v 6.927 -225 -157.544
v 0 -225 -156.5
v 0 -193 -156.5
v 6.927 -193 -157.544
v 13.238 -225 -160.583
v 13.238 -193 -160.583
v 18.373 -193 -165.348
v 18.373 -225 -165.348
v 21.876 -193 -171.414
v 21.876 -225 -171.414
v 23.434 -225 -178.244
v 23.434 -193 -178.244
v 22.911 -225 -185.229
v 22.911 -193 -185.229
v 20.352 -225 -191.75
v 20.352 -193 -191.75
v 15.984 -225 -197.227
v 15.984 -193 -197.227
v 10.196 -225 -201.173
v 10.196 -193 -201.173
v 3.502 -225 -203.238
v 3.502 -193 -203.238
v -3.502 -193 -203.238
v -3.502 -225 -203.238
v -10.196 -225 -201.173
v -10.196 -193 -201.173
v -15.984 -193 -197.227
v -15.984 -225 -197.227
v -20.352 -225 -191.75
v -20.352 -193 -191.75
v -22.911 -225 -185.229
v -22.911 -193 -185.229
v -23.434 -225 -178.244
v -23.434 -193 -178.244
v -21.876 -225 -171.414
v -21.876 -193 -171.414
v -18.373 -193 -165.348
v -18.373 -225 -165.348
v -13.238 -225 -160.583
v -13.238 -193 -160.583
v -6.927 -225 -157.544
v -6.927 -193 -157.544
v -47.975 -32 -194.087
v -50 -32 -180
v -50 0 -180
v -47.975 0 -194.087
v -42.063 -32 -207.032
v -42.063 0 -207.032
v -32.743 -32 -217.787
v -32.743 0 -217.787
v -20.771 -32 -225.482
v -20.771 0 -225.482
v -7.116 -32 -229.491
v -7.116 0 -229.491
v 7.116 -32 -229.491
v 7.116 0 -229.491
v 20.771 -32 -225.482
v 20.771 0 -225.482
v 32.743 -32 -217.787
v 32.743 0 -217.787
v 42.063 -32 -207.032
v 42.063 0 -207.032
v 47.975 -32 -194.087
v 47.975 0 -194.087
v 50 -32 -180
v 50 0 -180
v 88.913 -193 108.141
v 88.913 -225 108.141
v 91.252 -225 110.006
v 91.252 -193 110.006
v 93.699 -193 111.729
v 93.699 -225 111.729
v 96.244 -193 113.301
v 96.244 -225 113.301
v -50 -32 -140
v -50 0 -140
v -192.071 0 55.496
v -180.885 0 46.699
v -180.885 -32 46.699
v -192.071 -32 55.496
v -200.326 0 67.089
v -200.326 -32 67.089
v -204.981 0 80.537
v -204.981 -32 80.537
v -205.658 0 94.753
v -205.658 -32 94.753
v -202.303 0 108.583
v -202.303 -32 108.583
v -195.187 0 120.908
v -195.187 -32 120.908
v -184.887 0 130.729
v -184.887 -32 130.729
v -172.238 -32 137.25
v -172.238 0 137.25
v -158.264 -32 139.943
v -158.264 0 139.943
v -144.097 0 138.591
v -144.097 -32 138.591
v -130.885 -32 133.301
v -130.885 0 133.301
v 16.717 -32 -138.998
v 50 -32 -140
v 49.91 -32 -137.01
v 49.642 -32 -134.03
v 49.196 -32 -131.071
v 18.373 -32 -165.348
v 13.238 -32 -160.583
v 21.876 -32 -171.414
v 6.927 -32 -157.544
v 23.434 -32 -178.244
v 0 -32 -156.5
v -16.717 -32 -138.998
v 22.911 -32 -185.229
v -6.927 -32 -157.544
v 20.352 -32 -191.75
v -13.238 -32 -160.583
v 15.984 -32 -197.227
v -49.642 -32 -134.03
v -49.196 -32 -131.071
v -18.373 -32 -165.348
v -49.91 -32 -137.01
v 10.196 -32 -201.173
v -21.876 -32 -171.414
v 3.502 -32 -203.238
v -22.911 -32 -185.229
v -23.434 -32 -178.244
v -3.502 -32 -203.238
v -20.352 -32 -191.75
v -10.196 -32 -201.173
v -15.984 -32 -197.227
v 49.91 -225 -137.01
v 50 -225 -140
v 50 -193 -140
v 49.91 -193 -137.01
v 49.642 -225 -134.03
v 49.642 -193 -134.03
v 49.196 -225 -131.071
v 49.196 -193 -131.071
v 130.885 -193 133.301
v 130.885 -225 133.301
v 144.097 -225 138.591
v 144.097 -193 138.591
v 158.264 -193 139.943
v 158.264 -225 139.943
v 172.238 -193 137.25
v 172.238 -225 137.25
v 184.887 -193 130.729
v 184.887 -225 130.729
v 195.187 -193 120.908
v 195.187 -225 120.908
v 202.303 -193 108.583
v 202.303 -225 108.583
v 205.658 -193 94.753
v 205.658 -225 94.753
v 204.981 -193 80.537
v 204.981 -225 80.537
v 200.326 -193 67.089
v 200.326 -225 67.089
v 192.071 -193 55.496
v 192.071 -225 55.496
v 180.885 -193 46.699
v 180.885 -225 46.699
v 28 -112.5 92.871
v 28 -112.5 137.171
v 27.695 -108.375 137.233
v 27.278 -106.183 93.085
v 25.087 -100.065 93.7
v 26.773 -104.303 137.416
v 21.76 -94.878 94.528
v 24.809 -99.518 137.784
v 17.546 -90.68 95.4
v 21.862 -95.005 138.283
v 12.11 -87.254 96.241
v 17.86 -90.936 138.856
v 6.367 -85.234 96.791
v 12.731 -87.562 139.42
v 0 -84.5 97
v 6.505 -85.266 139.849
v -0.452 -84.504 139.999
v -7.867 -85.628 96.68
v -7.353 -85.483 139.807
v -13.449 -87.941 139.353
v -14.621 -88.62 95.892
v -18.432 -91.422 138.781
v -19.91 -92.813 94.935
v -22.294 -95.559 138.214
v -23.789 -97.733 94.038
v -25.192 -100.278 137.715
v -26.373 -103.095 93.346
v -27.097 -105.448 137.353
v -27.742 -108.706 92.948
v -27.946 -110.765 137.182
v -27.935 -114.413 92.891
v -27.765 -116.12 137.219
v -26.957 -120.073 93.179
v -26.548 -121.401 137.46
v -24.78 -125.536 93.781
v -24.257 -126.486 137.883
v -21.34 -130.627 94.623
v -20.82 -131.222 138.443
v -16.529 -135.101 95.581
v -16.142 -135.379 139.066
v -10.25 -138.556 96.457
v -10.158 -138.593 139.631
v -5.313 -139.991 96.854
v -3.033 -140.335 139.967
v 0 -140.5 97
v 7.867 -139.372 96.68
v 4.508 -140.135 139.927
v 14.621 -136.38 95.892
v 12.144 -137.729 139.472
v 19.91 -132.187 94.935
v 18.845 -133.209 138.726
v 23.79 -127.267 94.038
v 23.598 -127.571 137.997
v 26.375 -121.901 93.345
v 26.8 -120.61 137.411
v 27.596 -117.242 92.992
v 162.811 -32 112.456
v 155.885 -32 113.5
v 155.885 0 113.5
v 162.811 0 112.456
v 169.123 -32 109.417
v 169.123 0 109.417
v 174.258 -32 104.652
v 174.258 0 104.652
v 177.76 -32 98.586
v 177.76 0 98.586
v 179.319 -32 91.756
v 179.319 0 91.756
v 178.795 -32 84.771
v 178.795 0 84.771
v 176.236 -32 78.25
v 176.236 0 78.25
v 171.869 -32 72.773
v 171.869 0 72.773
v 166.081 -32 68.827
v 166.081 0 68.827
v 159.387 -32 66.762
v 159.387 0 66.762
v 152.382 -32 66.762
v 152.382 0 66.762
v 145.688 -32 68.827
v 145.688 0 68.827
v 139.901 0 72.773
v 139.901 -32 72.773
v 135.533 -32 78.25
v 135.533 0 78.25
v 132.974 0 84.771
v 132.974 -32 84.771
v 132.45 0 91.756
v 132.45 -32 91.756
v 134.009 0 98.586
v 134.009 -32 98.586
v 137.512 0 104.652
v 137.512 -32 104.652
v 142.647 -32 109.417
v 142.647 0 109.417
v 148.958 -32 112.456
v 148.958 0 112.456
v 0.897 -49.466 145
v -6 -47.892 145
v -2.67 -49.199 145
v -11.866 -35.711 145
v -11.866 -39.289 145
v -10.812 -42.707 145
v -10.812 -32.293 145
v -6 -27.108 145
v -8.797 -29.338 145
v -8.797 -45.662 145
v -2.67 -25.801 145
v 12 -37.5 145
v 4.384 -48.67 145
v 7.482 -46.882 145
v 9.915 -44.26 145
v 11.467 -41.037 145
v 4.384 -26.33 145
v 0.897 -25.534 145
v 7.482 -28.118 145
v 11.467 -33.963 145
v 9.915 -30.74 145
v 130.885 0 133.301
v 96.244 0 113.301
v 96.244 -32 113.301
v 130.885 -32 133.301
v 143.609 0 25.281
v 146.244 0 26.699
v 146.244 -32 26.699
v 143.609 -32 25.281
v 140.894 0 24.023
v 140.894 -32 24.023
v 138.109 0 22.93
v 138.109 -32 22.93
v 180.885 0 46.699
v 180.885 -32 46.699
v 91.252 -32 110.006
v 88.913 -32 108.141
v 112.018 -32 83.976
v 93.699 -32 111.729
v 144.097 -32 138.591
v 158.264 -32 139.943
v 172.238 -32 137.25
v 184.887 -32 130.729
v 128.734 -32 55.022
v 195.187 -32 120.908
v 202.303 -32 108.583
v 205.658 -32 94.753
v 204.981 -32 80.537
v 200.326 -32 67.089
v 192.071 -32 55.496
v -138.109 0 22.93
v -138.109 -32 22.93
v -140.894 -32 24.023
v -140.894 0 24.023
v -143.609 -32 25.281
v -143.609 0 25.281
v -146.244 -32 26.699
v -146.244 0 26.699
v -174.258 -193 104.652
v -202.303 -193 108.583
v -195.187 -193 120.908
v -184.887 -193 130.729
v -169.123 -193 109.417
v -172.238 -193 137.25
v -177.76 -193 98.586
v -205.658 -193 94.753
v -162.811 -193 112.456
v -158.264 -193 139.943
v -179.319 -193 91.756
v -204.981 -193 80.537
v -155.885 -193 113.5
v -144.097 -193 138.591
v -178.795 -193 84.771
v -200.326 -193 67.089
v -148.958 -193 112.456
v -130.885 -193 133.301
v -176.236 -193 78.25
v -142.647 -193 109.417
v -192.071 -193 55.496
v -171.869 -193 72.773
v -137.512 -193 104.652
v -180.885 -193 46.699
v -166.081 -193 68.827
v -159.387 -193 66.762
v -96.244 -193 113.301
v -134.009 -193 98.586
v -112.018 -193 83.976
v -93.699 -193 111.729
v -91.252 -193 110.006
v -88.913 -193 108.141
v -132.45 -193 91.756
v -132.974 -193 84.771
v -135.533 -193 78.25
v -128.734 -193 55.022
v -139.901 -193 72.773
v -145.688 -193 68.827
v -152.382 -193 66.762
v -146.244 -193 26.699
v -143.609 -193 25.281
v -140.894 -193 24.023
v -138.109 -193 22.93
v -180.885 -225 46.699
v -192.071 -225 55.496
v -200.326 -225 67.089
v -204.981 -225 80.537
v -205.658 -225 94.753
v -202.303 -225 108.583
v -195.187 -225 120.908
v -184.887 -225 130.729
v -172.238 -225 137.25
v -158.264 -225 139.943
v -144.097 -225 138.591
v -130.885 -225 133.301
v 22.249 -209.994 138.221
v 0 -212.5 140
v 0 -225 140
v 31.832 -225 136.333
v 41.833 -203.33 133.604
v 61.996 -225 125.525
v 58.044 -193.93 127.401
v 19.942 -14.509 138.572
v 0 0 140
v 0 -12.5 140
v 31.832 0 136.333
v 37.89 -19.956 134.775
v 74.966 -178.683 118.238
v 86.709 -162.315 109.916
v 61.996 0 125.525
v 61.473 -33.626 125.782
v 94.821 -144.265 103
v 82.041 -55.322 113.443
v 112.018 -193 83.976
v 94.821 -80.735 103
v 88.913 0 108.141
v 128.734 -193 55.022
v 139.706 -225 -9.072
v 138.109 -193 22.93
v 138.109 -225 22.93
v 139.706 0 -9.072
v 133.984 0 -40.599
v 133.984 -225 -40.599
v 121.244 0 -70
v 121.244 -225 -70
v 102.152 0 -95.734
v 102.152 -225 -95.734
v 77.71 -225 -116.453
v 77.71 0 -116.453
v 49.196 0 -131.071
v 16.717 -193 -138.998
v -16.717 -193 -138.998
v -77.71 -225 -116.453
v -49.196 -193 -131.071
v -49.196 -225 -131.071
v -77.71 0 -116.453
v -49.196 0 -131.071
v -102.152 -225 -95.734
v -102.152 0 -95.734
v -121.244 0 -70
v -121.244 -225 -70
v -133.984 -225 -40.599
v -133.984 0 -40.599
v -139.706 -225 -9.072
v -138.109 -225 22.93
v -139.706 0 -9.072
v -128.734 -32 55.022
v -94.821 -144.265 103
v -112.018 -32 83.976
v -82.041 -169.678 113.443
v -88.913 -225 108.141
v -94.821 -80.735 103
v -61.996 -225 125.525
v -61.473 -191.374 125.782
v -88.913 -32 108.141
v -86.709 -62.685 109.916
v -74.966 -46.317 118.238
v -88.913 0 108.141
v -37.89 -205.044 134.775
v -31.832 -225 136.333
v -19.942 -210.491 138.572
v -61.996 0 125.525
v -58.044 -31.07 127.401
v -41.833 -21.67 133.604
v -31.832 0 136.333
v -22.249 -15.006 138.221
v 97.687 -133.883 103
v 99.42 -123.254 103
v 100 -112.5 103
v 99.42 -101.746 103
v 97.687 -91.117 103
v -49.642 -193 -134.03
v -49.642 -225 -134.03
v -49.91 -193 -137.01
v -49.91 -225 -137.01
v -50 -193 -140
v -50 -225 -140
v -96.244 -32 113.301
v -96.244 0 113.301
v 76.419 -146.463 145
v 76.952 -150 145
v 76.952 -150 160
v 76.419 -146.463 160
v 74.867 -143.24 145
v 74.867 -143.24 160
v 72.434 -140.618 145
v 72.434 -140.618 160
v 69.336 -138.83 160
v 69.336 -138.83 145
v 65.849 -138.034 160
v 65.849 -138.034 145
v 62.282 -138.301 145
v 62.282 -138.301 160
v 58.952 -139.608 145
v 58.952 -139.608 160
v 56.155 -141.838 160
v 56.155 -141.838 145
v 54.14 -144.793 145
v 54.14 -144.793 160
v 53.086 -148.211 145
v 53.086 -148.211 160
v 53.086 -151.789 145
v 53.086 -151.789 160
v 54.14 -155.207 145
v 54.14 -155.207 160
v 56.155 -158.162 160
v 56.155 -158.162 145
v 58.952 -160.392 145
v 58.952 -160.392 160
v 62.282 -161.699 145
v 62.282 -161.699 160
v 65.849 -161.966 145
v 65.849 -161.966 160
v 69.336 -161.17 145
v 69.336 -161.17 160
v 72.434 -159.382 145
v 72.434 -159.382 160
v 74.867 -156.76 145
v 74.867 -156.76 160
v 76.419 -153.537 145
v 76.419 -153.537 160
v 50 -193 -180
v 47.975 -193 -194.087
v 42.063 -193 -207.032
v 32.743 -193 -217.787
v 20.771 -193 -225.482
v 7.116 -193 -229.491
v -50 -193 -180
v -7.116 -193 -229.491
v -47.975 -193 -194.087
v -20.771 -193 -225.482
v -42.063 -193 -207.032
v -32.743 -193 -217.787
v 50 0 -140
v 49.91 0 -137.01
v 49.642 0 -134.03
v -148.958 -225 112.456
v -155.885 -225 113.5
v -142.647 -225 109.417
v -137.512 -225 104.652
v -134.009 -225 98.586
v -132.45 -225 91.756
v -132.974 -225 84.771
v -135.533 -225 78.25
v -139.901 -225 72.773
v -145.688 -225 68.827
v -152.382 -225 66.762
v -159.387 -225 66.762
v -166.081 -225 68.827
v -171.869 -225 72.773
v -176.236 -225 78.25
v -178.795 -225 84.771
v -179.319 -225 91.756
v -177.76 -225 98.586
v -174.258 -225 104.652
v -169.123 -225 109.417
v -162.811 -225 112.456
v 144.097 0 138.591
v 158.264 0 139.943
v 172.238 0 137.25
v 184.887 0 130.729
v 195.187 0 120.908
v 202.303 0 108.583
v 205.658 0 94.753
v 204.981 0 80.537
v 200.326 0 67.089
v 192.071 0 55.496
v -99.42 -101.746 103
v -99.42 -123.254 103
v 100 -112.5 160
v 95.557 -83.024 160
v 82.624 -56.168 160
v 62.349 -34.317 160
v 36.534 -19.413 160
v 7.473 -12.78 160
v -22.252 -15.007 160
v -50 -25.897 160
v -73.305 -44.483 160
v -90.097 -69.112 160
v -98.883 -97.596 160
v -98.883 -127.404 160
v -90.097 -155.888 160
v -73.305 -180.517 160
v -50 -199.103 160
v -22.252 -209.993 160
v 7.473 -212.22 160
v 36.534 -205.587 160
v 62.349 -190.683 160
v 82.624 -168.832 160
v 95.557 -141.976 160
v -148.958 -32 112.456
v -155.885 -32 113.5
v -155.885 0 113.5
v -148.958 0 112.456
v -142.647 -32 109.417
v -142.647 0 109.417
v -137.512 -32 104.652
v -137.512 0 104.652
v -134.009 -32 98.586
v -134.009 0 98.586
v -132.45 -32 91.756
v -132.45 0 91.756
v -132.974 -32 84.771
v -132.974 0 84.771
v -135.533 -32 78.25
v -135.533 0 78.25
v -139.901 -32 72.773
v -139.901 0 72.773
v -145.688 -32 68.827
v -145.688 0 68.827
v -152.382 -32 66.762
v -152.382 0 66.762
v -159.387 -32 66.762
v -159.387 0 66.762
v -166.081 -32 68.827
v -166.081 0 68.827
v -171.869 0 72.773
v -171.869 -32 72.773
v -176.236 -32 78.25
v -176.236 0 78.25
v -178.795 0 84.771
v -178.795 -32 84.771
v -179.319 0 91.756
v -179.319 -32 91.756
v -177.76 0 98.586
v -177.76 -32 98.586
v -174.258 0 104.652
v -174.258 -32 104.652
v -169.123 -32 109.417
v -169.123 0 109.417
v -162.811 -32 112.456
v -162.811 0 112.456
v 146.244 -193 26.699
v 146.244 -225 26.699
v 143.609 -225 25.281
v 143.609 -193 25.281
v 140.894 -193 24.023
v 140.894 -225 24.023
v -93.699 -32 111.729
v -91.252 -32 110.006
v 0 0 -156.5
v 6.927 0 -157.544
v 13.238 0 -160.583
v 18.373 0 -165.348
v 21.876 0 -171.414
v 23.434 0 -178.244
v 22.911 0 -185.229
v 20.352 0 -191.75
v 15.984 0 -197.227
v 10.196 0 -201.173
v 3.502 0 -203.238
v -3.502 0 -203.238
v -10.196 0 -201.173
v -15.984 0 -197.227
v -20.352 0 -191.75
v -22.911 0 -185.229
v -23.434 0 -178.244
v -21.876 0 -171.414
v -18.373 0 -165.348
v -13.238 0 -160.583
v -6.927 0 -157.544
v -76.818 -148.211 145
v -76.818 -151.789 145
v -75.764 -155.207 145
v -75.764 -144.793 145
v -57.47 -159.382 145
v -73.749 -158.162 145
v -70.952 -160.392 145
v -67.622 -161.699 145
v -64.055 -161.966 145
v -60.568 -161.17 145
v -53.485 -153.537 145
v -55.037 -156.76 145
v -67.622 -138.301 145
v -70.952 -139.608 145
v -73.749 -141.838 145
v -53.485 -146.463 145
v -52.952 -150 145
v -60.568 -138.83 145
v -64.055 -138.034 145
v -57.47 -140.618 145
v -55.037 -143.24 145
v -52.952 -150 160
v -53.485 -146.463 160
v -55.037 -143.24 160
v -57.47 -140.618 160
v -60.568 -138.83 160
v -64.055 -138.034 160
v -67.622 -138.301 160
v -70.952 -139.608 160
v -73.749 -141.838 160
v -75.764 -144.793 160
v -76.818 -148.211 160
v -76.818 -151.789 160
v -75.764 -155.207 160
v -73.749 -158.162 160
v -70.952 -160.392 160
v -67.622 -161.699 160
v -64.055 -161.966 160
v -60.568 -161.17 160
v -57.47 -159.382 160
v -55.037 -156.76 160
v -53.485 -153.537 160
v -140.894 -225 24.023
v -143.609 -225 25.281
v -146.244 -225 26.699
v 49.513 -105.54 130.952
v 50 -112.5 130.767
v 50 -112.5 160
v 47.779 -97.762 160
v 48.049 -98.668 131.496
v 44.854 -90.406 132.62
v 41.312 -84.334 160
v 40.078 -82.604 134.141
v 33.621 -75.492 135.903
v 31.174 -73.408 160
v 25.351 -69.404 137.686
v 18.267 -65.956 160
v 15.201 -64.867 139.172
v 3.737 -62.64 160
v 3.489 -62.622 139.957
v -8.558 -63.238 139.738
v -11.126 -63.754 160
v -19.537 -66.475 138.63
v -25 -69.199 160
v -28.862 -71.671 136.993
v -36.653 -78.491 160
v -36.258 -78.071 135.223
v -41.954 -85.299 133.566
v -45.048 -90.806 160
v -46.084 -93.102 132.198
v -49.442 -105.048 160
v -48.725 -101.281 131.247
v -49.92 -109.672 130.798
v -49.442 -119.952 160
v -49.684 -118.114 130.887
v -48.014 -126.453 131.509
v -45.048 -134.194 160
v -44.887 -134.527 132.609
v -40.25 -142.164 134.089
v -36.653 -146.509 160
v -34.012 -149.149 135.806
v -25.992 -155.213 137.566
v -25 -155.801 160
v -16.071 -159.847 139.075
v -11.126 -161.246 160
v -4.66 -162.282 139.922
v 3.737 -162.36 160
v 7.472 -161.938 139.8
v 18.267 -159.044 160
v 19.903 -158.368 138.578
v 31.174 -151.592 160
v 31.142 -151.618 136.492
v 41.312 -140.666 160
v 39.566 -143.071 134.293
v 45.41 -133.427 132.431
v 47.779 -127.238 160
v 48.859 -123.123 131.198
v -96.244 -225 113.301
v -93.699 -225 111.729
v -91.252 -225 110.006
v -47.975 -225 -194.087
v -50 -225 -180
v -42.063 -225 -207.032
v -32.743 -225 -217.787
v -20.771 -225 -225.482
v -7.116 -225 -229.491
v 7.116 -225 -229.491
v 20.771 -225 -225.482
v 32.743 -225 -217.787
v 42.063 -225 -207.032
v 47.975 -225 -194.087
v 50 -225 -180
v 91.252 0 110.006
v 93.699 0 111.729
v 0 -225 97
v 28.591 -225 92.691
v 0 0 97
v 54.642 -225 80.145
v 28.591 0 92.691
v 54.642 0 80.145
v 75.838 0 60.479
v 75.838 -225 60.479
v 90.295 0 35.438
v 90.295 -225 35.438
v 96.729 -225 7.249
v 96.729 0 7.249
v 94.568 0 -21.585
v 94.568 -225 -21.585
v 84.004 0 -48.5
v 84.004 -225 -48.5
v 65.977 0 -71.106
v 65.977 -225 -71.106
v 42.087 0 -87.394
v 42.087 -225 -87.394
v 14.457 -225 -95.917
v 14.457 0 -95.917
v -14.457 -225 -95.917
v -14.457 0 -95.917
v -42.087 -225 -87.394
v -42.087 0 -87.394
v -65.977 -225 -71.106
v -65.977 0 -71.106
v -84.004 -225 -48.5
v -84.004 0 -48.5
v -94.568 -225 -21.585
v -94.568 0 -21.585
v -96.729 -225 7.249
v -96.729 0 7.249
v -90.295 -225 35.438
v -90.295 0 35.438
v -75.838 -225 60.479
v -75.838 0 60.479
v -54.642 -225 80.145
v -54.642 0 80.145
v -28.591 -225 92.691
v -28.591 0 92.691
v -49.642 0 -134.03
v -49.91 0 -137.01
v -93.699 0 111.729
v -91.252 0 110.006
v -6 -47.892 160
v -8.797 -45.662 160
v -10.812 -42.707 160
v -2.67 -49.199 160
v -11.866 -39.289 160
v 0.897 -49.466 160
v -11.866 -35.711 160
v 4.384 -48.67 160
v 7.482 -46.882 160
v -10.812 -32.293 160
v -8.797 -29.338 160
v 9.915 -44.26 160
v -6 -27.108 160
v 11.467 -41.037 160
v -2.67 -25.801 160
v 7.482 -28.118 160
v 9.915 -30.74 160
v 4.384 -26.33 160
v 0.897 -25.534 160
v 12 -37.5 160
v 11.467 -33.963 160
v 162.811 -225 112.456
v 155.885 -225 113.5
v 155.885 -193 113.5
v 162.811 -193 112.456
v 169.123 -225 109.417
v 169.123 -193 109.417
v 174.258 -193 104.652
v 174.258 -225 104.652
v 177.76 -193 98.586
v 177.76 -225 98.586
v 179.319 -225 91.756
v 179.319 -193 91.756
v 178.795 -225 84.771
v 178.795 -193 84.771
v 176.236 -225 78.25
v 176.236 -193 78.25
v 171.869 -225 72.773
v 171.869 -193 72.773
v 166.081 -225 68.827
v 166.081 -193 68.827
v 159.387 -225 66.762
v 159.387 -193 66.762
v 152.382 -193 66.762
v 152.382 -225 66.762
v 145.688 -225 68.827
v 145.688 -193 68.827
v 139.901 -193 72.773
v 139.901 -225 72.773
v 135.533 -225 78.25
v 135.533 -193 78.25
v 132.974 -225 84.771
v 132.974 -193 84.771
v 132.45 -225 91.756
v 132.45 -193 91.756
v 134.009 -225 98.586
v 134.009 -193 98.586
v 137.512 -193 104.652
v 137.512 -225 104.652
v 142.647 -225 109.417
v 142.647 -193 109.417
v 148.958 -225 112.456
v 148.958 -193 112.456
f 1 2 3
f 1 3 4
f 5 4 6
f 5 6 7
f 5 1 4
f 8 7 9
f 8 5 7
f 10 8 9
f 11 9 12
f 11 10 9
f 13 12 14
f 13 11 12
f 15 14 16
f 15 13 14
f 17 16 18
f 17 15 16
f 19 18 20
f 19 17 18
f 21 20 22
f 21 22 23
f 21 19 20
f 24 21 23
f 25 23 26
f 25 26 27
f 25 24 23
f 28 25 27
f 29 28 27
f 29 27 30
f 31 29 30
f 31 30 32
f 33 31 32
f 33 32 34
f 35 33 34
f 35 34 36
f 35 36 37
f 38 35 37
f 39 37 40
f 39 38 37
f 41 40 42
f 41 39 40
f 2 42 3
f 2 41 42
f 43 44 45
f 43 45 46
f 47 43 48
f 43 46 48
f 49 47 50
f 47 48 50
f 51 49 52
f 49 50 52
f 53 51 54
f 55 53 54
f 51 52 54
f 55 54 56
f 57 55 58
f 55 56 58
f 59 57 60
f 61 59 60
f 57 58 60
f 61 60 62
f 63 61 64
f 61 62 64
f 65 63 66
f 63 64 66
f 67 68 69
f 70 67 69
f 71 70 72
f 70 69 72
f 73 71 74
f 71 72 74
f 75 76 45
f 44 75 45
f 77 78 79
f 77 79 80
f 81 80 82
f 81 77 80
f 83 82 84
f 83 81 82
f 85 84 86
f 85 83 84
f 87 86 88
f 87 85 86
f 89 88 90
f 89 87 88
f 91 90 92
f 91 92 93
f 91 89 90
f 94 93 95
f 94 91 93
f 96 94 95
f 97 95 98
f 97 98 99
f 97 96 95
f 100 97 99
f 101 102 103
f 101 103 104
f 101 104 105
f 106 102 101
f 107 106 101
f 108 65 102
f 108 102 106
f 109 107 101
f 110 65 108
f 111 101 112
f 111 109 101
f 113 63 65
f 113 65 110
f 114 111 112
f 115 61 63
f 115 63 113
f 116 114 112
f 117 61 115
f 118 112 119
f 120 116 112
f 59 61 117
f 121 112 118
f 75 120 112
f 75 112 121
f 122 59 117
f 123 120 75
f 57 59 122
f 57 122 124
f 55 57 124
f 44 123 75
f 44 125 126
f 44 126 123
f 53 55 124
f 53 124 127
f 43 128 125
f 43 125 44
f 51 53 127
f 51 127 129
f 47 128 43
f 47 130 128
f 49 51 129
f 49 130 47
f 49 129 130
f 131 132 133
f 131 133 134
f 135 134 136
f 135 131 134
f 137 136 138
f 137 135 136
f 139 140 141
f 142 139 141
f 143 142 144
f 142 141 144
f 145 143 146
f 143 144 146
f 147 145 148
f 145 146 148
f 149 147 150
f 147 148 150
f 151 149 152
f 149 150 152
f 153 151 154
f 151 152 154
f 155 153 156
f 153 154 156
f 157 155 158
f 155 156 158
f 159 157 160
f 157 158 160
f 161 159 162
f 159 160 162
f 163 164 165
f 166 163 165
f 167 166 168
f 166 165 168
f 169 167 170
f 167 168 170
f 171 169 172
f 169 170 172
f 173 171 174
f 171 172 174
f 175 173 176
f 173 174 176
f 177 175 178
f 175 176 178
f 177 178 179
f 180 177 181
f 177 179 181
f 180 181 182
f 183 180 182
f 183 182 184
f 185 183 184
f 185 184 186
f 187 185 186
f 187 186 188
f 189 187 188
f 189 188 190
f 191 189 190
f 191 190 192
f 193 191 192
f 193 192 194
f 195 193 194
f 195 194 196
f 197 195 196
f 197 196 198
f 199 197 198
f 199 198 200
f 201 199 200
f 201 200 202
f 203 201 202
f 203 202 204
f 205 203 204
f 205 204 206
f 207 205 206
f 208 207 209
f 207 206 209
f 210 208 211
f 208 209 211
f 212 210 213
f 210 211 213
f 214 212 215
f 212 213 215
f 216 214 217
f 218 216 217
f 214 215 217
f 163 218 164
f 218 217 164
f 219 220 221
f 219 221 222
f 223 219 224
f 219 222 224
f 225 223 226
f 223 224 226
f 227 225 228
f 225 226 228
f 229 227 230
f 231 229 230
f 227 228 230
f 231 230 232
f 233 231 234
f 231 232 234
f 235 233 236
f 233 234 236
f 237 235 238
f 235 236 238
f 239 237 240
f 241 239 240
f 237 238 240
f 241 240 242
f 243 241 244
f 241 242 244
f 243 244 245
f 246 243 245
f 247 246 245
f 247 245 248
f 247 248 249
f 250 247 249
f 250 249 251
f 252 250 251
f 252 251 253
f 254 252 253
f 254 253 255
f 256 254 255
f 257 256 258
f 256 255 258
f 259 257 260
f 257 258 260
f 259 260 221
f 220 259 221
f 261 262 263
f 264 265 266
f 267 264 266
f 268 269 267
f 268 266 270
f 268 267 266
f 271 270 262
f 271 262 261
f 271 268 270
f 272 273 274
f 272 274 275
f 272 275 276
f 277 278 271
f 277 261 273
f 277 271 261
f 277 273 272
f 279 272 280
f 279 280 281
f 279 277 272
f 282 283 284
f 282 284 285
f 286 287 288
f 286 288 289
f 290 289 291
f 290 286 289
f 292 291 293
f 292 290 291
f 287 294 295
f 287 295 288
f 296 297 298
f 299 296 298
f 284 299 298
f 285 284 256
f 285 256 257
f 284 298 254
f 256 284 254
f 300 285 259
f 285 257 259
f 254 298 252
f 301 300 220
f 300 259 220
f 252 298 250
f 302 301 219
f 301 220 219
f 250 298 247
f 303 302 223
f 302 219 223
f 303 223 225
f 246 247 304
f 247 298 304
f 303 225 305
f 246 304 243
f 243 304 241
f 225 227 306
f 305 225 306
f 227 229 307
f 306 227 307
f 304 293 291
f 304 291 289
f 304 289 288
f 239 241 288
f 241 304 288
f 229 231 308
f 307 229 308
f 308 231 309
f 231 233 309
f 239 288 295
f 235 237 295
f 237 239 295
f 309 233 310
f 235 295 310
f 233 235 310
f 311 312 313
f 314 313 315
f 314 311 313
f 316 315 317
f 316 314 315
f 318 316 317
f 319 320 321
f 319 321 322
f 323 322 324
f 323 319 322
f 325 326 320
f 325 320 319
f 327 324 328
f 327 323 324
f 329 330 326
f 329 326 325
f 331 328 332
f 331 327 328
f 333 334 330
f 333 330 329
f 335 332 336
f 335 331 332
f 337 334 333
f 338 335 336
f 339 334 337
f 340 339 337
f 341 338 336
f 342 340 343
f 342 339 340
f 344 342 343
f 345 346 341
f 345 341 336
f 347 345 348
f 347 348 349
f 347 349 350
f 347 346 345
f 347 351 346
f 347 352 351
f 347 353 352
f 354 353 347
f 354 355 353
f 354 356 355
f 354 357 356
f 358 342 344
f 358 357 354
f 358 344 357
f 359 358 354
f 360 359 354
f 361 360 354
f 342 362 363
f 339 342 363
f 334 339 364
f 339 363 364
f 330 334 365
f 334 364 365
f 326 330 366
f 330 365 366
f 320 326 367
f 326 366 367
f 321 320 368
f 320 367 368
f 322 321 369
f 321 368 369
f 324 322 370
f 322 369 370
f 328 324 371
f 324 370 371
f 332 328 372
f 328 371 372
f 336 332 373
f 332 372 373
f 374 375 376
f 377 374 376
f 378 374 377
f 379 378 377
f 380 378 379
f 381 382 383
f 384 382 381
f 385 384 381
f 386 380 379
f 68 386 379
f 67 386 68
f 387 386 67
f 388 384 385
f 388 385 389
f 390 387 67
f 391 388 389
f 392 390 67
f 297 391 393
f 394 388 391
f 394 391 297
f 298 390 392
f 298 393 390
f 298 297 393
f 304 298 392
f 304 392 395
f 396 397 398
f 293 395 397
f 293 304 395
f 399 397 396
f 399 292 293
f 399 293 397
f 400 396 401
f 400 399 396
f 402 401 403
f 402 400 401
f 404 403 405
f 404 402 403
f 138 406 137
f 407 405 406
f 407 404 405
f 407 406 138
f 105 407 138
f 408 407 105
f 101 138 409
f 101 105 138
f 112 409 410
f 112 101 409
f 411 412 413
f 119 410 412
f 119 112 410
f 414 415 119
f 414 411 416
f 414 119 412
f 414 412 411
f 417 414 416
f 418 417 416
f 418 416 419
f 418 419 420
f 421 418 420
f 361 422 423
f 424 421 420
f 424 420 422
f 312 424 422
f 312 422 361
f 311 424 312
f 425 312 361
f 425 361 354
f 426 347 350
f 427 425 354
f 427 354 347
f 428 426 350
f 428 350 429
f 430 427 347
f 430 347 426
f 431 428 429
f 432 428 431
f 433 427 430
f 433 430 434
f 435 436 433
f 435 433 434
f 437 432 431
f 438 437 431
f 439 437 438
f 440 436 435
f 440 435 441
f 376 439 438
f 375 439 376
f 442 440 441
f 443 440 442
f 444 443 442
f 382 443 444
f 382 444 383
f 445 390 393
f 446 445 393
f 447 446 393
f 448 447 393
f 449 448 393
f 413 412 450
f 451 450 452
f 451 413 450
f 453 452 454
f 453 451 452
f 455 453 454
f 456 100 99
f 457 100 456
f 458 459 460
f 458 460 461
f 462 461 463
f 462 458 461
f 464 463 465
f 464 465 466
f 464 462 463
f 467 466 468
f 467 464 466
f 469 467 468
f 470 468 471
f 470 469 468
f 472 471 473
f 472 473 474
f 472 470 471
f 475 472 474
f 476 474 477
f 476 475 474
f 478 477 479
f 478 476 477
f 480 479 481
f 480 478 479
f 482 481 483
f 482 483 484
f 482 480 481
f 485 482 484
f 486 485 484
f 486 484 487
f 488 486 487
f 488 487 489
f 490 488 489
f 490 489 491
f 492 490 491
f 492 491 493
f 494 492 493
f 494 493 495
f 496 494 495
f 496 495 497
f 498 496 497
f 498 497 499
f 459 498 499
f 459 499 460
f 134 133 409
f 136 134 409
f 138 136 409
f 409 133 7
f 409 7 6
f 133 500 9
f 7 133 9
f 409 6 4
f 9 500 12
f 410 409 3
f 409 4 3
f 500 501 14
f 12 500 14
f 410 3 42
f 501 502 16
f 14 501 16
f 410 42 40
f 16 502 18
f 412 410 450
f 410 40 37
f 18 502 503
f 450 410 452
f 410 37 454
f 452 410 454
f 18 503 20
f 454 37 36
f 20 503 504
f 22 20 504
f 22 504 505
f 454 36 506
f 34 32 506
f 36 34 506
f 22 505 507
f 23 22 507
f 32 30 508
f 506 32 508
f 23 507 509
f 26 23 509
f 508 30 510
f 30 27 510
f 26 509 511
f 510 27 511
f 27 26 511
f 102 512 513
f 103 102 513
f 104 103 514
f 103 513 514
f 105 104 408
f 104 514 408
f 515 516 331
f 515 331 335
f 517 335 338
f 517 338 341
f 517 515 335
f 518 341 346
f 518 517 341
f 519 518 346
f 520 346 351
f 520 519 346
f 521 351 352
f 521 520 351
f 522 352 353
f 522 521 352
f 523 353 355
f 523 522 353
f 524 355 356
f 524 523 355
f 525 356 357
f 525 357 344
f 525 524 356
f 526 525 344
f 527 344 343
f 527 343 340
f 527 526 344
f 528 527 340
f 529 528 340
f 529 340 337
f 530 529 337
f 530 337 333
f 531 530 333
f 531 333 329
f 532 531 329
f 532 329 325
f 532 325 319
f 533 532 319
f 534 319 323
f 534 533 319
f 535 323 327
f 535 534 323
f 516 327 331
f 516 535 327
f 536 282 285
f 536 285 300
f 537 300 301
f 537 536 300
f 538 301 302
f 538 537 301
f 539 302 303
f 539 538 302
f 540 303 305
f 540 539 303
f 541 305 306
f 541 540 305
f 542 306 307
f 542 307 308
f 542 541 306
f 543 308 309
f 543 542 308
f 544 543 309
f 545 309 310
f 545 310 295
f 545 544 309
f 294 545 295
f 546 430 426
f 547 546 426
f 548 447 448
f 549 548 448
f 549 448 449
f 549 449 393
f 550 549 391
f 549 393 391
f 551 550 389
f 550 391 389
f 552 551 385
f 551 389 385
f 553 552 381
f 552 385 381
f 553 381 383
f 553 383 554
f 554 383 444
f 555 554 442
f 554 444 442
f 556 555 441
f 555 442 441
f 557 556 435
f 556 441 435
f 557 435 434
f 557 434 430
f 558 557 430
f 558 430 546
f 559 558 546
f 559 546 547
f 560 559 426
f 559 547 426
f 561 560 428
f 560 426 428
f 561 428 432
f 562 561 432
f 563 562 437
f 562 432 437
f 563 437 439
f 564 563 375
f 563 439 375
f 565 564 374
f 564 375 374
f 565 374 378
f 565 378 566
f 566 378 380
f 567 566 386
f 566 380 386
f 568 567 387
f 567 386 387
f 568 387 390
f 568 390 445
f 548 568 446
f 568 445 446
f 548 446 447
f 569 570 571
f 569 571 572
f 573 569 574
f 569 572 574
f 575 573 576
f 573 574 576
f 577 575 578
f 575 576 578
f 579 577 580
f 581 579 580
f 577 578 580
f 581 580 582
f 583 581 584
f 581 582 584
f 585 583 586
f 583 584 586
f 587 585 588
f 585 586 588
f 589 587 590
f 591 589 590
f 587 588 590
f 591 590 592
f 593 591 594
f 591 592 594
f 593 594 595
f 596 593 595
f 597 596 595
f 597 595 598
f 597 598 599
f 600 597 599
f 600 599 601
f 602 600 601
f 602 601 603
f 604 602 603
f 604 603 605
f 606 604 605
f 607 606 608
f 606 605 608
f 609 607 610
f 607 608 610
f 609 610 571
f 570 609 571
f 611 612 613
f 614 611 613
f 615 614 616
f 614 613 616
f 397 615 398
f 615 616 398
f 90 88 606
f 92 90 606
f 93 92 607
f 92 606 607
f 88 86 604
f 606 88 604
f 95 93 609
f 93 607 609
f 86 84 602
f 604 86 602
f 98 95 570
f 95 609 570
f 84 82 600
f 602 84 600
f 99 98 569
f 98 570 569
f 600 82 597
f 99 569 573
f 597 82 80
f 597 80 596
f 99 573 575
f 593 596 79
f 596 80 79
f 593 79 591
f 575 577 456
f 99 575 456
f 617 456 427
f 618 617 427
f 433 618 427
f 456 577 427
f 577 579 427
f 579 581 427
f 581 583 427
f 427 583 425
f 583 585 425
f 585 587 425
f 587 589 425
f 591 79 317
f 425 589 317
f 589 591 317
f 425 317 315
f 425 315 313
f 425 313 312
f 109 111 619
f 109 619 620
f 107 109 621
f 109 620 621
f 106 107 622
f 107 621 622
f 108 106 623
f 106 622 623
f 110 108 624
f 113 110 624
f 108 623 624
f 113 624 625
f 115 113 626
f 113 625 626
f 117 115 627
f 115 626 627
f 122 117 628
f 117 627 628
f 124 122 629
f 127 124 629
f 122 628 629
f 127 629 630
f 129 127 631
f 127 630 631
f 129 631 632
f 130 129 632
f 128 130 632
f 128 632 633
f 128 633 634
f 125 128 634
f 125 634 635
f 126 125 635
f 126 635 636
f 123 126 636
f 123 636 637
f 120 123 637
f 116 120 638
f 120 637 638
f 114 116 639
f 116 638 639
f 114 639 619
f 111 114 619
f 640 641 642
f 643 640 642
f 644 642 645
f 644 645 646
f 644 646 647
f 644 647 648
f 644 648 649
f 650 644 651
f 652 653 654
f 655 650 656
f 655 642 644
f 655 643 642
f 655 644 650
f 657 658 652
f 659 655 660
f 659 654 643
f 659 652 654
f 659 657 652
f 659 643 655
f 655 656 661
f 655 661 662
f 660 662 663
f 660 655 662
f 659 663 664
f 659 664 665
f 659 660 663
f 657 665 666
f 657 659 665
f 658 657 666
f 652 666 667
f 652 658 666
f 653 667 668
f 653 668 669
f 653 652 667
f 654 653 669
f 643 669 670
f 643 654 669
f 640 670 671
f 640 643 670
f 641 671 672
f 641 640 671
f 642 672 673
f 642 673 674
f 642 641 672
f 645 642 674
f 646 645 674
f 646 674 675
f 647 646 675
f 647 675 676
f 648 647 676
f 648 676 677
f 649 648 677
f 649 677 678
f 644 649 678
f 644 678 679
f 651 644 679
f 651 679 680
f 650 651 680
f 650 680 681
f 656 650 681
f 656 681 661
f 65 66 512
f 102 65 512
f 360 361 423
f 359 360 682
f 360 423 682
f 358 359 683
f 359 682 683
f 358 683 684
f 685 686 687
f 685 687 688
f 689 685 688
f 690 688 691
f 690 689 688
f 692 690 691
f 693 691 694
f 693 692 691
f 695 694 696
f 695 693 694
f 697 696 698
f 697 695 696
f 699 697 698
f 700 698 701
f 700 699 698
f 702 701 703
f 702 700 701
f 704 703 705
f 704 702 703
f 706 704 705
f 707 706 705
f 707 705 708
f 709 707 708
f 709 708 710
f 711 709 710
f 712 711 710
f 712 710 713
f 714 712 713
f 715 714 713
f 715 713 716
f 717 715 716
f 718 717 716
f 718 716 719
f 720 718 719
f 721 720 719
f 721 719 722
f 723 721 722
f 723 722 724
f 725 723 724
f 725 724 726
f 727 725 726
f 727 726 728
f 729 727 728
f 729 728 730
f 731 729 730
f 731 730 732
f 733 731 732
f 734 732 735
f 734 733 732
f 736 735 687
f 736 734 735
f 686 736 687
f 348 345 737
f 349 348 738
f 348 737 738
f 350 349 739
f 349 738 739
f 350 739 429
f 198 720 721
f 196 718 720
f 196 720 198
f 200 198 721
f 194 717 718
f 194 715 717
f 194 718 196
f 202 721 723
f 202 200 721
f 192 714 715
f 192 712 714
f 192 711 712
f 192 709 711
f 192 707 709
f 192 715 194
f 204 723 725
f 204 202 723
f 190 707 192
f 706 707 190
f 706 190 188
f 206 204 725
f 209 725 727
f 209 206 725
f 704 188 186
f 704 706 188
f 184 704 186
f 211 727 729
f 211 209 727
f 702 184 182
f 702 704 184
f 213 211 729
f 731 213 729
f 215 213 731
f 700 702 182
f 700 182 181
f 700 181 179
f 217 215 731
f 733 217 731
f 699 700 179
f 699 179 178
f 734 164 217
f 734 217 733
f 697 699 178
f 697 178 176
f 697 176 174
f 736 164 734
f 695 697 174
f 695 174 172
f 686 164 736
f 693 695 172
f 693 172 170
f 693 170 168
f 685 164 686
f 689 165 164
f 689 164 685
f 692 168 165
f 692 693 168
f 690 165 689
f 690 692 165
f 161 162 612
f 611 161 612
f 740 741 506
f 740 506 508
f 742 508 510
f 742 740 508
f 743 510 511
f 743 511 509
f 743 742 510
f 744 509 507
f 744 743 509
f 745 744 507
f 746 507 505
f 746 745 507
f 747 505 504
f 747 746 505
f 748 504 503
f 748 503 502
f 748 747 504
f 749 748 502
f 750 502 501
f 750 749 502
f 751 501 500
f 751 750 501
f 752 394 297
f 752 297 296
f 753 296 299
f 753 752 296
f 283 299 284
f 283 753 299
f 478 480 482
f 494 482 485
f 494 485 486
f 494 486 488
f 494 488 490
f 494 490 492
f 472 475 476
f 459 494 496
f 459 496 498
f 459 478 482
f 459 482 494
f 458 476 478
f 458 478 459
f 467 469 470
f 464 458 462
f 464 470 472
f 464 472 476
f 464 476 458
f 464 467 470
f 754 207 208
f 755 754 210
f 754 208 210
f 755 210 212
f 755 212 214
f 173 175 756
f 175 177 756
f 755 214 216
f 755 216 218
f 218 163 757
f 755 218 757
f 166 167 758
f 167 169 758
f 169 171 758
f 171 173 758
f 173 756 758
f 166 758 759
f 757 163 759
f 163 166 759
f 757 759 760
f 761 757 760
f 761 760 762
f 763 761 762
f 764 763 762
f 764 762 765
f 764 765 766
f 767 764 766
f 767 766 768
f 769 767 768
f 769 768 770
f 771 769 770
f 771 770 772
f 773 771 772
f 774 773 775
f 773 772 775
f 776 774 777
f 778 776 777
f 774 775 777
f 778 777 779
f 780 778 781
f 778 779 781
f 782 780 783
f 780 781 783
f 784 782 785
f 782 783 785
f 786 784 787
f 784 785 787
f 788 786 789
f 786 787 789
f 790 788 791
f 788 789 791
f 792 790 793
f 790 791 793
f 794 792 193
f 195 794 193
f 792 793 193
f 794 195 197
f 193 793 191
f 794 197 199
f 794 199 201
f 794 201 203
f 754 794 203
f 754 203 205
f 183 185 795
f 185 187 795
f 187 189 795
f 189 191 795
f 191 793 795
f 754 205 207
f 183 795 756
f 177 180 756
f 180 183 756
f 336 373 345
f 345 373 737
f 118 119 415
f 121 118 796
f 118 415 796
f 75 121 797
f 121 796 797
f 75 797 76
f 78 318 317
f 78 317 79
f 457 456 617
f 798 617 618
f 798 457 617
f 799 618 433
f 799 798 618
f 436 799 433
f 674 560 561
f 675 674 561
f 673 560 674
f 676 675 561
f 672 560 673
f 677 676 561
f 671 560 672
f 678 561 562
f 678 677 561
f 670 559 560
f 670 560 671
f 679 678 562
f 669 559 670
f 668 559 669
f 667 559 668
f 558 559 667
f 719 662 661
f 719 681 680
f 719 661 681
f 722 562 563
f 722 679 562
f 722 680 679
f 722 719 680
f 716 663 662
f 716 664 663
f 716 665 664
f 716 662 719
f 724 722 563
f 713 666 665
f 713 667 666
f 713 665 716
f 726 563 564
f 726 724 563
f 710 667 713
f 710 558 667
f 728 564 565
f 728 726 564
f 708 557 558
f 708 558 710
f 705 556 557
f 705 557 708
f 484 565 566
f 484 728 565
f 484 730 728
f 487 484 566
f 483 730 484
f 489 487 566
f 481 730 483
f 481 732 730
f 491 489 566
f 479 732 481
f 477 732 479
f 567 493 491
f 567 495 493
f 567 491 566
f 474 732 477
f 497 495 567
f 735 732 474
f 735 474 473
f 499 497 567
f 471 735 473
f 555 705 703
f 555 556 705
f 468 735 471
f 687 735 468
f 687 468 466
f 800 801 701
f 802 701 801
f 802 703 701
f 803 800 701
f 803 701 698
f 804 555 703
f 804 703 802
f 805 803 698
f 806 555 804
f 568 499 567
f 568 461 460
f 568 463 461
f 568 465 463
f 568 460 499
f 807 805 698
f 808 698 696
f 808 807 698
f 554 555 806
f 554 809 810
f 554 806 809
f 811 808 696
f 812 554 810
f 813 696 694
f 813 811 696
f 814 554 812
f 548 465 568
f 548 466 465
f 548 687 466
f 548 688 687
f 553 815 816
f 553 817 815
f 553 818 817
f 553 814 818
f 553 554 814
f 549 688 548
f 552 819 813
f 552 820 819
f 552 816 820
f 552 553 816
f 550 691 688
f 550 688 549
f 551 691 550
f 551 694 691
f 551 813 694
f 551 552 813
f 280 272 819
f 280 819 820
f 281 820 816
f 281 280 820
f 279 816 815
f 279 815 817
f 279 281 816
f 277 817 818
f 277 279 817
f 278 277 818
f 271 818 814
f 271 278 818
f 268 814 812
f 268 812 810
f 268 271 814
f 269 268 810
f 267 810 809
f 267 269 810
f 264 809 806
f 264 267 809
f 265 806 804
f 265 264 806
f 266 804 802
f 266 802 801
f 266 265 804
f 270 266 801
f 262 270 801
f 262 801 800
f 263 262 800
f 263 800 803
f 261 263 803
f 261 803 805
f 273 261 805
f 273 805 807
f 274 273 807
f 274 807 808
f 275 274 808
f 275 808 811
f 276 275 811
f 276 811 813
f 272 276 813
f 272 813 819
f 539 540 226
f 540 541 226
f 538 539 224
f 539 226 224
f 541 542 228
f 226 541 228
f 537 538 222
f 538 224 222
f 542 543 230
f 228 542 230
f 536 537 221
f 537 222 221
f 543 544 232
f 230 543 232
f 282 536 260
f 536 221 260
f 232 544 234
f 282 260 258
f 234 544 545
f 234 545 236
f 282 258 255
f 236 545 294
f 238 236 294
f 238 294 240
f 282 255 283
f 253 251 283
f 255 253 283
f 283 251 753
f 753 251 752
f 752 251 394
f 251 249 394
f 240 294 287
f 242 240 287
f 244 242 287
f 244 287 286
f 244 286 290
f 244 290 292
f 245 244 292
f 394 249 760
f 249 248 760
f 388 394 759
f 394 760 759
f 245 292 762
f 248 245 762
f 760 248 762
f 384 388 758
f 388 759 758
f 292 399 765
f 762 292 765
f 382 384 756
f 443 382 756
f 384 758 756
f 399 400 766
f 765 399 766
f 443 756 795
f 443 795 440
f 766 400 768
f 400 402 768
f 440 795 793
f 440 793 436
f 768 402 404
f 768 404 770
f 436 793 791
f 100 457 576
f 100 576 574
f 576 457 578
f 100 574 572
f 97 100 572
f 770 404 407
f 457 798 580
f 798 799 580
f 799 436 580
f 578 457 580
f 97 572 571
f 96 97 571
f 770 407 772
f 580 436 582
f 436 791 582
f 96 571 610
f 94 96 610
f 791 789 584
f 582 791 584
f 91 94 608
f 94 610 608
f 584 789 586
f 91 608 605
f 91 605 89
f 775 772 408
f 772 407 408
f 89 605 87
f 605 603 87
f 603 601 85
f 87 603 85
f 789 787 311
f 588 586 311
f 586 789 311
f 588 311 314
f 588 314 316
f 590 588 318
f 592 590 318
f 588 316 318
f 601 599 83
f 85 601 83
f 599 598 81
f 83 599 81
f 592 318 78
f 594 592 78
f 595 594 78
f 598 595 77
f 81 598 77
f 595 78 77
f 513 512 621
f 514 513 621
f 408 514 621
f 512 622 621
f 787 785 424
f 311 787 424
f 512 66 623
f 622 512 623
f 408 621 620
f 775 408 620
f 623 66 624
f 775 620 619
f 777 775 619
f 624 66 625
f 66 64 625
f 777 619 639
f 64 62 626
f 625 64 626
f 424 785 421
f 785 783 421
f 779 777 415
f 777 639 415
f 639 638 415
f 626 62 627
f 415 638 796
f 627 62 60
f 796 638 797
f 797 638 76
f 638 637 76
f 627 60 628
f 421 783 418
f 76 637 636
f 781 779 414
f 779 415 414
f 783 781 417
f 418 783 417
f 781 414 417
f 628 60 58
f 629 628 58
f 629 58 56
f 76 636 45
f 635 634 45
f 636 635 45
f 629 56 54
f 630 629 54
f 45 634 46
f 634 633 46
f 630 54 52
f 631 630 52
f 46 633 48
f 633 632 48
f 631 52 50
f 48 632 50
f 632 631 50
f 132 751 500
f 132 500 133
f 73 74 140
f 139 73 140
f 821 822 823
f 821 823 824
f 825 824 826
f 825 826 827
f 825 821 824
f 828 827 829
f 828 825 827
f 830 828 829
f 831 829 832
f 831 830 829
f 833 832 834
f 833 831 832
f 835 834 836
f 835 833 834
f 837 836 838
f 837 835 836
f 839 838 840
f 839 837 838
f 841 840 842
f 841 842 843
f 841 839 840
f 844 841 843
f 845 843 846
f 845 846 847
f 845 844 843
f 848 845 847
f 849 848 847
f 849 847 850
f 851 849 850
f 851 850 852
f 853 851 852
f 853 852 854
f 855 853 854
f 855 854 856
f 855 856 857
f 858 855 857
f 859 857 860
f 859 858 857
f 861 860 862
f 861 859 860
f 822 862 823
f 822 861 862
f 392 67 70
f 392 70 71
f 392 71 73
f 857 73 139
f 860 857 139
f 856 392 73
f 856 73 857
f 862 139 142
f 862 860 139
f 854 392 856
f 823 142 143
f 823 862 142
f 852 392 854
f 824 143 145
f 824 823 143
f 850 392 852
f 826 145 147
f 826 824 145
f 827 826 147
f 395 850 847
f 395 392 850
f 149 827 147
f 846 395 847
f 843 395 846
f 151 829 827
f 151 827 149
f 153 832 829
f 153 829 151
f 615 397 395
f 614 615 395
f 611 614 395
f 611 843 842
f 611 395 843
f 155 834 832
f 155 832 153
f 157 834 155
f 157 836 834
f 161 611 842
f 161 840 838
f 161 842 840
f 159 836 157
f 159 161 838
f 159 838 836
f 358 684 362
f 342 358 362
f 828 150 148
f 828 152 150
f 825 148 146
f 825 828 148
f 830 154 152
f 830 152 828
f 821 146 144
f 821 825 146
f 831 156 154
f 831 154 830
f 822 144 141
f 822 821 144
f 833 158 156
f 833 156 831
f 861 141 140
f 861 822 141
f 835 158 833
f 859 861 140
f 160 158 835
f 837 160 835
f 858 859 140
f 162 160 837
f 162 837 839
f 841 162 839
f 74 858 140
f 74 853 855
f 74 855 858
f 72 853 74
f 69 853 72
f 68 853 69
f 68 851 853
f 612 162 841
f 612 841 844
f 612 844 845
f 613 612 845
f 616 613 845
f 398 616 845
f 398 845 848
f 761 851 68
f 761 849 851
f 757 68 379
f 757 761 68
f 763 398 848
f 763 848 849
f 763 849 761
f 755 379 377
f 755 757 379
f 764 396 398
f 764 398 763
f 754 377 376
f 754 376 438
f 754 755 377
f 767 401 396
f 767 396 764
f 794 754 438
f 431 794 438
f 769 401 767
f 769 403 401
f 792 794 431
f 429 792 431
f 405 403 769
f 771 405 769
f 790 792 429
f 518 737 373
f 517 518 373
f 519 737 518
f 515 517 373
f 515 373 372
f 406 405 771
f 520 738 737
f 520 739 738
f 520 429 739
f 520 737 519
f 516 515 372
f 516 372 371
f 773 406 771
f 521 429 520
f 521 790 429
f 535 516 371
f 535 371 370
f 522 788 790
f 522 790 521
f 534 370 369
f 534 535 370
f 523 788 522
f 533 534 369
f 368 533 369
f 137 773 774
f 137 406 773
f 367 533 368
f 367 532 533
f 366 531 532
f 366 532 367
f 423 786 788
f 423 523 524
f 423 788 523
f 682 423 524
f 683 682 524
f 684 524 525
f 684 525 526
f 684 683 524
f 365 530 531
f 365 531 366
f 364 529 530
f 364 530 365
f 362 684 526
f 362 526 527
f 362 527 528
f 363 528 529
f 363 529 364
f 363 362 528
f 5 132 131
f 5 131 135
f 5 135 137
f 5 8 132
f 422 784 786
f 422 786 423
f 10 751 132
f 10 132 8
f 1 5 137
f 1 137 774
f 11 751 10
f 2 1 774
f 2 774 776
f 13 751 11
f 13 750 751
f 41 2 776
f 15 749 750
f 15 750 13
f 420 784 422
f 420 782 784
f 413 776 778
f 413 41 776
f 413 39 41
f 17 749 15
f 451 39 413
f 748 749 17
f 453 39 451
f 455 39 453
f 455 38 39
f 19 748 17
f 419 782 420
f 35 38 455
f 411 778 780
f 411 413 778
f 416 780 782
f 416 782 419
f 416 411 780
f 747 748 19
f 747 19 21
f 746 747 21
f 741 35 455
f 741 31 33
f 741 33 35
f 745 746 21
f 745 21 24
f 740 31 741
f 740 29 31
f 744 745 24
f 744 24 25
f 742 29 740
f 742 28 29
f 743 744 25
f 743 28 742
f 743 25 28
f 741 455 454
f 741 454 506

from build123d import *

# Parameters (mm, degrees)
SKETCH1_R                = 140
SKETCH1_R_2              = 97
BOSS_EXTRUDE1_DEPTH      = 225
SKETCH2_R                = 23.5
BOSS_EXTRUDE2_DEPTH      = 32
CUT_EXTRUDE3_REACH       = 481.493
CUT_EXTRUDE3_END_RADIUS  = 97
SKETCH8_R                = 28
BOSS_EXTRUDE4_DEPTH      = 20
BOSS_EXTRUDE4_DEPTH_BACK = 37
SKETCH9_R                = 100
SKETCH9_R_2              = 50
SKETCH10_R               = 12
CUT_EXTRUDE4_DEPTH       = 20
SKETCH10_2_R             = 12
BOSS_EXTRUDE5_DEPTH      = 5


with BuildPart() as part:
    # Sketch1 → Boss-Extrude1 (new body)
    with BuildSketch(Plane(origin=(0, 0, 0), x_dir=(1, 0, 0), z_dir=(0, 1, 0))):
        with Locations(Location((0, 0, 0), (0, 0, 270))):
            Circle(SKETCH1_R)
        with Locations(Location((0, 0, 0), (0, 0, 270))):
            Circle(SKETCH1_R_2, mode=Mode.SUBTRACT)
    extrude(amount=-BOSS_EXTRUDE1_DEPTH)

    # Sketch2 → Boss-Extrude2 (add)
    # profile 1 of 3: a face of its own
    with BuildSketch(Plane(origin=(0, 0, 0), x_dir=(1, 0, 0), z_dir=(0, 1, 0))):
        with BuildLine():
            Line((50, 180), (50, 140))
            ThreePointArc((50, 140), (46.560641243, 121.776205471), (36.715732519, 106.059537635))
            Line((36.715732519, 106.059537635), (-36.715732519, 106.059537635))
            ThreePointArc((-36.715732519, 106.059537635), (-46.560641243, 121.776205471), (-50, 140))
            Line((-50, 140), (-50, 180))
            ThreePointArc((-50, 180), (0, 230), (50, 180))
        make_face()
        with Locations(Location((0, 180, 0), (0, 0, 270))):
            Circle(SKETCH2_R, mode=Mode.SUBTRACT)
    # profile 2 of 3: a face of its own
    with BuildSketch(Plane(origin=(0, 0, 0), x_dir=(1, 0, 0), z_dir=(0, 1, 0))):
        with BuildLine():
            Line((110.208120165, -21.233011737), (73.492387646, -84.826525898))
            ThreePointArc((73.492387646, -84.826525898), (82.180966893, -101.210800869), (96.24355653, -113.301270189))
            Line((96.24355653, -113.301270189), (130.884572681, -133.301270189))
            ThreePointArc((130.884572681, -133.301270189), (199.18584287, -115), (180.884572681, -46.698729811))
            Line((180.884572681, -46.698729811), (146.24355653, -26.698729811))
            ThreePointArc((146.24355653, -26.698729811), (128.741608136, -20.565404603), (110.208120165, -21.233011737))
        make_face()
        with Locations(Location((155.884572681, -90, 0), (0, 0, 270))):
            Circle(SKETCH2_R, mode=Mode.SUBTRACT)
    # profile 3 of 3: a face of its own
    with BuildSketch(Plane(origin=(0, 0, 0), x_dir=(1, 0, 0), z_dir=(0, 1, 0))):
        with BuildLine():
            Line((-73.492387646, -84.826525898), (-110.208120165, -21.233011737))
            ThreePointArc((-110.208120165, -21.233011737), (-128.741608136, -20.565404603), (-146.24355653, -26.698729811))
            Line((-146.24355653, -26.698729811), (-180.884572681, -46.698729811))
            ThreePointArc((-180.884572681, -46.698729811), (-199.18584287, -115), (-130.884572681, -133.301270189))
            Line((-130.884572681, -133.301270189), (-96.24355653, -113.301270189))
            ThreePointArc((-96.24355653, -113.301270189), (-82.180966893, -101.210800869), (-73.492387646, -84.826525898))
        make_face()
        with Locations(Location((-155.884572681, -90, 0), (0, 0, 270))):
            Circle(SKETCH2_R, mode=Mode.SUBTRACT)
    boss_extrude2 = extrude(amount=-BOSS_EXTRUDE2_DEPTH)

    # Mirror1: Boss-Extrude2 across plane
    add(boss_extrude2.mirror(Plane(origin=(0, -112.5, 0), x_dir=(0, 0, 1), z_dir=(0, -1, 0))))

    # Cut-Extrude3: up to this cylinder (the profile starts outside it)
    cut_extrude3_end = Plane(origin=(0, -112.5, 0), z_dir=(0, 1, 0)) * Cylinder(CUT_EXTRUDE3_END_RADIUS, 1157.986, mode=Mode.PRIVATE)
    # Sketch8 → Cut-Extrude3 (cut, up to the surface)
    with BuildSketch(Plane.XY.offset(140), mode=Mode.PRIVATE) as cut_extrude3_sk1:
        with Locations((0, -112.5)):
            Circle(SKETCH8_R)
    cut_extrude3_tool1 = extrude(cut_extrude3_sk1.sketch, amount=-CUT_EXTRUDE3_REACH, mode=Mode.PRIVATE) - cut_extrude3_end
    add(cut_extrude3_tool1.solids().sort_by_distance((0, -112.5, 140))[0], mode=Mode.SUBTRACT)

    # Sketch9 → Boss-Extrude4 (add, two sides: drawn at the far end of the back side and taken through both)
    with BuildSketch(Plane.XY.offset(140).offset(-BOSS_EXTRUDE4_DEPTH_BACK)):
        with Locations((0, -112.5)):
            Circle(SKETCH9_R)
        with Locations((0, -112.5)):
            Circle(SKETCH9_R_2, mode=Mode.SUBTRACT)
    extrude(amount=BOSS_EXTRUDE4_DEPTH + BOSS_EXTRUDE4_DEPTH_BACK)

    # Sketch10 → Cut-Extrude4 (cut)
    with BuildSketch(Plane.XY.offset(140)):
        with Locations((0, -37.5)):
            Circle(SKETCH10_R)
        with Locations((64.951905284, -150)):
            Circle(SKETCH10_R)
        with Locations((-64.951905284, -150)):
            Circle(SKETCH10_R)
    extrude(amount=CUT_EXTRUDE4_DEPTH, mode=Mode.SUBTRACT)

    # Sketch10<2> → Boss-Extrude5 (add)
    with BuildSketch(Plane.XY.offset(140)):
        with Locations((0, -37.5)):
            Circle(SKETCH10_2_R)
        with Locations((64.951905284, -150)):
            Circle(SKETCH10_2_R)
        with Locations((-64.951905284, -150)):
            Circle(SKETCH10_2_R)
    extrude(amount=BOSS_EXTRUDE5_DEPTH)


solid = part.part
